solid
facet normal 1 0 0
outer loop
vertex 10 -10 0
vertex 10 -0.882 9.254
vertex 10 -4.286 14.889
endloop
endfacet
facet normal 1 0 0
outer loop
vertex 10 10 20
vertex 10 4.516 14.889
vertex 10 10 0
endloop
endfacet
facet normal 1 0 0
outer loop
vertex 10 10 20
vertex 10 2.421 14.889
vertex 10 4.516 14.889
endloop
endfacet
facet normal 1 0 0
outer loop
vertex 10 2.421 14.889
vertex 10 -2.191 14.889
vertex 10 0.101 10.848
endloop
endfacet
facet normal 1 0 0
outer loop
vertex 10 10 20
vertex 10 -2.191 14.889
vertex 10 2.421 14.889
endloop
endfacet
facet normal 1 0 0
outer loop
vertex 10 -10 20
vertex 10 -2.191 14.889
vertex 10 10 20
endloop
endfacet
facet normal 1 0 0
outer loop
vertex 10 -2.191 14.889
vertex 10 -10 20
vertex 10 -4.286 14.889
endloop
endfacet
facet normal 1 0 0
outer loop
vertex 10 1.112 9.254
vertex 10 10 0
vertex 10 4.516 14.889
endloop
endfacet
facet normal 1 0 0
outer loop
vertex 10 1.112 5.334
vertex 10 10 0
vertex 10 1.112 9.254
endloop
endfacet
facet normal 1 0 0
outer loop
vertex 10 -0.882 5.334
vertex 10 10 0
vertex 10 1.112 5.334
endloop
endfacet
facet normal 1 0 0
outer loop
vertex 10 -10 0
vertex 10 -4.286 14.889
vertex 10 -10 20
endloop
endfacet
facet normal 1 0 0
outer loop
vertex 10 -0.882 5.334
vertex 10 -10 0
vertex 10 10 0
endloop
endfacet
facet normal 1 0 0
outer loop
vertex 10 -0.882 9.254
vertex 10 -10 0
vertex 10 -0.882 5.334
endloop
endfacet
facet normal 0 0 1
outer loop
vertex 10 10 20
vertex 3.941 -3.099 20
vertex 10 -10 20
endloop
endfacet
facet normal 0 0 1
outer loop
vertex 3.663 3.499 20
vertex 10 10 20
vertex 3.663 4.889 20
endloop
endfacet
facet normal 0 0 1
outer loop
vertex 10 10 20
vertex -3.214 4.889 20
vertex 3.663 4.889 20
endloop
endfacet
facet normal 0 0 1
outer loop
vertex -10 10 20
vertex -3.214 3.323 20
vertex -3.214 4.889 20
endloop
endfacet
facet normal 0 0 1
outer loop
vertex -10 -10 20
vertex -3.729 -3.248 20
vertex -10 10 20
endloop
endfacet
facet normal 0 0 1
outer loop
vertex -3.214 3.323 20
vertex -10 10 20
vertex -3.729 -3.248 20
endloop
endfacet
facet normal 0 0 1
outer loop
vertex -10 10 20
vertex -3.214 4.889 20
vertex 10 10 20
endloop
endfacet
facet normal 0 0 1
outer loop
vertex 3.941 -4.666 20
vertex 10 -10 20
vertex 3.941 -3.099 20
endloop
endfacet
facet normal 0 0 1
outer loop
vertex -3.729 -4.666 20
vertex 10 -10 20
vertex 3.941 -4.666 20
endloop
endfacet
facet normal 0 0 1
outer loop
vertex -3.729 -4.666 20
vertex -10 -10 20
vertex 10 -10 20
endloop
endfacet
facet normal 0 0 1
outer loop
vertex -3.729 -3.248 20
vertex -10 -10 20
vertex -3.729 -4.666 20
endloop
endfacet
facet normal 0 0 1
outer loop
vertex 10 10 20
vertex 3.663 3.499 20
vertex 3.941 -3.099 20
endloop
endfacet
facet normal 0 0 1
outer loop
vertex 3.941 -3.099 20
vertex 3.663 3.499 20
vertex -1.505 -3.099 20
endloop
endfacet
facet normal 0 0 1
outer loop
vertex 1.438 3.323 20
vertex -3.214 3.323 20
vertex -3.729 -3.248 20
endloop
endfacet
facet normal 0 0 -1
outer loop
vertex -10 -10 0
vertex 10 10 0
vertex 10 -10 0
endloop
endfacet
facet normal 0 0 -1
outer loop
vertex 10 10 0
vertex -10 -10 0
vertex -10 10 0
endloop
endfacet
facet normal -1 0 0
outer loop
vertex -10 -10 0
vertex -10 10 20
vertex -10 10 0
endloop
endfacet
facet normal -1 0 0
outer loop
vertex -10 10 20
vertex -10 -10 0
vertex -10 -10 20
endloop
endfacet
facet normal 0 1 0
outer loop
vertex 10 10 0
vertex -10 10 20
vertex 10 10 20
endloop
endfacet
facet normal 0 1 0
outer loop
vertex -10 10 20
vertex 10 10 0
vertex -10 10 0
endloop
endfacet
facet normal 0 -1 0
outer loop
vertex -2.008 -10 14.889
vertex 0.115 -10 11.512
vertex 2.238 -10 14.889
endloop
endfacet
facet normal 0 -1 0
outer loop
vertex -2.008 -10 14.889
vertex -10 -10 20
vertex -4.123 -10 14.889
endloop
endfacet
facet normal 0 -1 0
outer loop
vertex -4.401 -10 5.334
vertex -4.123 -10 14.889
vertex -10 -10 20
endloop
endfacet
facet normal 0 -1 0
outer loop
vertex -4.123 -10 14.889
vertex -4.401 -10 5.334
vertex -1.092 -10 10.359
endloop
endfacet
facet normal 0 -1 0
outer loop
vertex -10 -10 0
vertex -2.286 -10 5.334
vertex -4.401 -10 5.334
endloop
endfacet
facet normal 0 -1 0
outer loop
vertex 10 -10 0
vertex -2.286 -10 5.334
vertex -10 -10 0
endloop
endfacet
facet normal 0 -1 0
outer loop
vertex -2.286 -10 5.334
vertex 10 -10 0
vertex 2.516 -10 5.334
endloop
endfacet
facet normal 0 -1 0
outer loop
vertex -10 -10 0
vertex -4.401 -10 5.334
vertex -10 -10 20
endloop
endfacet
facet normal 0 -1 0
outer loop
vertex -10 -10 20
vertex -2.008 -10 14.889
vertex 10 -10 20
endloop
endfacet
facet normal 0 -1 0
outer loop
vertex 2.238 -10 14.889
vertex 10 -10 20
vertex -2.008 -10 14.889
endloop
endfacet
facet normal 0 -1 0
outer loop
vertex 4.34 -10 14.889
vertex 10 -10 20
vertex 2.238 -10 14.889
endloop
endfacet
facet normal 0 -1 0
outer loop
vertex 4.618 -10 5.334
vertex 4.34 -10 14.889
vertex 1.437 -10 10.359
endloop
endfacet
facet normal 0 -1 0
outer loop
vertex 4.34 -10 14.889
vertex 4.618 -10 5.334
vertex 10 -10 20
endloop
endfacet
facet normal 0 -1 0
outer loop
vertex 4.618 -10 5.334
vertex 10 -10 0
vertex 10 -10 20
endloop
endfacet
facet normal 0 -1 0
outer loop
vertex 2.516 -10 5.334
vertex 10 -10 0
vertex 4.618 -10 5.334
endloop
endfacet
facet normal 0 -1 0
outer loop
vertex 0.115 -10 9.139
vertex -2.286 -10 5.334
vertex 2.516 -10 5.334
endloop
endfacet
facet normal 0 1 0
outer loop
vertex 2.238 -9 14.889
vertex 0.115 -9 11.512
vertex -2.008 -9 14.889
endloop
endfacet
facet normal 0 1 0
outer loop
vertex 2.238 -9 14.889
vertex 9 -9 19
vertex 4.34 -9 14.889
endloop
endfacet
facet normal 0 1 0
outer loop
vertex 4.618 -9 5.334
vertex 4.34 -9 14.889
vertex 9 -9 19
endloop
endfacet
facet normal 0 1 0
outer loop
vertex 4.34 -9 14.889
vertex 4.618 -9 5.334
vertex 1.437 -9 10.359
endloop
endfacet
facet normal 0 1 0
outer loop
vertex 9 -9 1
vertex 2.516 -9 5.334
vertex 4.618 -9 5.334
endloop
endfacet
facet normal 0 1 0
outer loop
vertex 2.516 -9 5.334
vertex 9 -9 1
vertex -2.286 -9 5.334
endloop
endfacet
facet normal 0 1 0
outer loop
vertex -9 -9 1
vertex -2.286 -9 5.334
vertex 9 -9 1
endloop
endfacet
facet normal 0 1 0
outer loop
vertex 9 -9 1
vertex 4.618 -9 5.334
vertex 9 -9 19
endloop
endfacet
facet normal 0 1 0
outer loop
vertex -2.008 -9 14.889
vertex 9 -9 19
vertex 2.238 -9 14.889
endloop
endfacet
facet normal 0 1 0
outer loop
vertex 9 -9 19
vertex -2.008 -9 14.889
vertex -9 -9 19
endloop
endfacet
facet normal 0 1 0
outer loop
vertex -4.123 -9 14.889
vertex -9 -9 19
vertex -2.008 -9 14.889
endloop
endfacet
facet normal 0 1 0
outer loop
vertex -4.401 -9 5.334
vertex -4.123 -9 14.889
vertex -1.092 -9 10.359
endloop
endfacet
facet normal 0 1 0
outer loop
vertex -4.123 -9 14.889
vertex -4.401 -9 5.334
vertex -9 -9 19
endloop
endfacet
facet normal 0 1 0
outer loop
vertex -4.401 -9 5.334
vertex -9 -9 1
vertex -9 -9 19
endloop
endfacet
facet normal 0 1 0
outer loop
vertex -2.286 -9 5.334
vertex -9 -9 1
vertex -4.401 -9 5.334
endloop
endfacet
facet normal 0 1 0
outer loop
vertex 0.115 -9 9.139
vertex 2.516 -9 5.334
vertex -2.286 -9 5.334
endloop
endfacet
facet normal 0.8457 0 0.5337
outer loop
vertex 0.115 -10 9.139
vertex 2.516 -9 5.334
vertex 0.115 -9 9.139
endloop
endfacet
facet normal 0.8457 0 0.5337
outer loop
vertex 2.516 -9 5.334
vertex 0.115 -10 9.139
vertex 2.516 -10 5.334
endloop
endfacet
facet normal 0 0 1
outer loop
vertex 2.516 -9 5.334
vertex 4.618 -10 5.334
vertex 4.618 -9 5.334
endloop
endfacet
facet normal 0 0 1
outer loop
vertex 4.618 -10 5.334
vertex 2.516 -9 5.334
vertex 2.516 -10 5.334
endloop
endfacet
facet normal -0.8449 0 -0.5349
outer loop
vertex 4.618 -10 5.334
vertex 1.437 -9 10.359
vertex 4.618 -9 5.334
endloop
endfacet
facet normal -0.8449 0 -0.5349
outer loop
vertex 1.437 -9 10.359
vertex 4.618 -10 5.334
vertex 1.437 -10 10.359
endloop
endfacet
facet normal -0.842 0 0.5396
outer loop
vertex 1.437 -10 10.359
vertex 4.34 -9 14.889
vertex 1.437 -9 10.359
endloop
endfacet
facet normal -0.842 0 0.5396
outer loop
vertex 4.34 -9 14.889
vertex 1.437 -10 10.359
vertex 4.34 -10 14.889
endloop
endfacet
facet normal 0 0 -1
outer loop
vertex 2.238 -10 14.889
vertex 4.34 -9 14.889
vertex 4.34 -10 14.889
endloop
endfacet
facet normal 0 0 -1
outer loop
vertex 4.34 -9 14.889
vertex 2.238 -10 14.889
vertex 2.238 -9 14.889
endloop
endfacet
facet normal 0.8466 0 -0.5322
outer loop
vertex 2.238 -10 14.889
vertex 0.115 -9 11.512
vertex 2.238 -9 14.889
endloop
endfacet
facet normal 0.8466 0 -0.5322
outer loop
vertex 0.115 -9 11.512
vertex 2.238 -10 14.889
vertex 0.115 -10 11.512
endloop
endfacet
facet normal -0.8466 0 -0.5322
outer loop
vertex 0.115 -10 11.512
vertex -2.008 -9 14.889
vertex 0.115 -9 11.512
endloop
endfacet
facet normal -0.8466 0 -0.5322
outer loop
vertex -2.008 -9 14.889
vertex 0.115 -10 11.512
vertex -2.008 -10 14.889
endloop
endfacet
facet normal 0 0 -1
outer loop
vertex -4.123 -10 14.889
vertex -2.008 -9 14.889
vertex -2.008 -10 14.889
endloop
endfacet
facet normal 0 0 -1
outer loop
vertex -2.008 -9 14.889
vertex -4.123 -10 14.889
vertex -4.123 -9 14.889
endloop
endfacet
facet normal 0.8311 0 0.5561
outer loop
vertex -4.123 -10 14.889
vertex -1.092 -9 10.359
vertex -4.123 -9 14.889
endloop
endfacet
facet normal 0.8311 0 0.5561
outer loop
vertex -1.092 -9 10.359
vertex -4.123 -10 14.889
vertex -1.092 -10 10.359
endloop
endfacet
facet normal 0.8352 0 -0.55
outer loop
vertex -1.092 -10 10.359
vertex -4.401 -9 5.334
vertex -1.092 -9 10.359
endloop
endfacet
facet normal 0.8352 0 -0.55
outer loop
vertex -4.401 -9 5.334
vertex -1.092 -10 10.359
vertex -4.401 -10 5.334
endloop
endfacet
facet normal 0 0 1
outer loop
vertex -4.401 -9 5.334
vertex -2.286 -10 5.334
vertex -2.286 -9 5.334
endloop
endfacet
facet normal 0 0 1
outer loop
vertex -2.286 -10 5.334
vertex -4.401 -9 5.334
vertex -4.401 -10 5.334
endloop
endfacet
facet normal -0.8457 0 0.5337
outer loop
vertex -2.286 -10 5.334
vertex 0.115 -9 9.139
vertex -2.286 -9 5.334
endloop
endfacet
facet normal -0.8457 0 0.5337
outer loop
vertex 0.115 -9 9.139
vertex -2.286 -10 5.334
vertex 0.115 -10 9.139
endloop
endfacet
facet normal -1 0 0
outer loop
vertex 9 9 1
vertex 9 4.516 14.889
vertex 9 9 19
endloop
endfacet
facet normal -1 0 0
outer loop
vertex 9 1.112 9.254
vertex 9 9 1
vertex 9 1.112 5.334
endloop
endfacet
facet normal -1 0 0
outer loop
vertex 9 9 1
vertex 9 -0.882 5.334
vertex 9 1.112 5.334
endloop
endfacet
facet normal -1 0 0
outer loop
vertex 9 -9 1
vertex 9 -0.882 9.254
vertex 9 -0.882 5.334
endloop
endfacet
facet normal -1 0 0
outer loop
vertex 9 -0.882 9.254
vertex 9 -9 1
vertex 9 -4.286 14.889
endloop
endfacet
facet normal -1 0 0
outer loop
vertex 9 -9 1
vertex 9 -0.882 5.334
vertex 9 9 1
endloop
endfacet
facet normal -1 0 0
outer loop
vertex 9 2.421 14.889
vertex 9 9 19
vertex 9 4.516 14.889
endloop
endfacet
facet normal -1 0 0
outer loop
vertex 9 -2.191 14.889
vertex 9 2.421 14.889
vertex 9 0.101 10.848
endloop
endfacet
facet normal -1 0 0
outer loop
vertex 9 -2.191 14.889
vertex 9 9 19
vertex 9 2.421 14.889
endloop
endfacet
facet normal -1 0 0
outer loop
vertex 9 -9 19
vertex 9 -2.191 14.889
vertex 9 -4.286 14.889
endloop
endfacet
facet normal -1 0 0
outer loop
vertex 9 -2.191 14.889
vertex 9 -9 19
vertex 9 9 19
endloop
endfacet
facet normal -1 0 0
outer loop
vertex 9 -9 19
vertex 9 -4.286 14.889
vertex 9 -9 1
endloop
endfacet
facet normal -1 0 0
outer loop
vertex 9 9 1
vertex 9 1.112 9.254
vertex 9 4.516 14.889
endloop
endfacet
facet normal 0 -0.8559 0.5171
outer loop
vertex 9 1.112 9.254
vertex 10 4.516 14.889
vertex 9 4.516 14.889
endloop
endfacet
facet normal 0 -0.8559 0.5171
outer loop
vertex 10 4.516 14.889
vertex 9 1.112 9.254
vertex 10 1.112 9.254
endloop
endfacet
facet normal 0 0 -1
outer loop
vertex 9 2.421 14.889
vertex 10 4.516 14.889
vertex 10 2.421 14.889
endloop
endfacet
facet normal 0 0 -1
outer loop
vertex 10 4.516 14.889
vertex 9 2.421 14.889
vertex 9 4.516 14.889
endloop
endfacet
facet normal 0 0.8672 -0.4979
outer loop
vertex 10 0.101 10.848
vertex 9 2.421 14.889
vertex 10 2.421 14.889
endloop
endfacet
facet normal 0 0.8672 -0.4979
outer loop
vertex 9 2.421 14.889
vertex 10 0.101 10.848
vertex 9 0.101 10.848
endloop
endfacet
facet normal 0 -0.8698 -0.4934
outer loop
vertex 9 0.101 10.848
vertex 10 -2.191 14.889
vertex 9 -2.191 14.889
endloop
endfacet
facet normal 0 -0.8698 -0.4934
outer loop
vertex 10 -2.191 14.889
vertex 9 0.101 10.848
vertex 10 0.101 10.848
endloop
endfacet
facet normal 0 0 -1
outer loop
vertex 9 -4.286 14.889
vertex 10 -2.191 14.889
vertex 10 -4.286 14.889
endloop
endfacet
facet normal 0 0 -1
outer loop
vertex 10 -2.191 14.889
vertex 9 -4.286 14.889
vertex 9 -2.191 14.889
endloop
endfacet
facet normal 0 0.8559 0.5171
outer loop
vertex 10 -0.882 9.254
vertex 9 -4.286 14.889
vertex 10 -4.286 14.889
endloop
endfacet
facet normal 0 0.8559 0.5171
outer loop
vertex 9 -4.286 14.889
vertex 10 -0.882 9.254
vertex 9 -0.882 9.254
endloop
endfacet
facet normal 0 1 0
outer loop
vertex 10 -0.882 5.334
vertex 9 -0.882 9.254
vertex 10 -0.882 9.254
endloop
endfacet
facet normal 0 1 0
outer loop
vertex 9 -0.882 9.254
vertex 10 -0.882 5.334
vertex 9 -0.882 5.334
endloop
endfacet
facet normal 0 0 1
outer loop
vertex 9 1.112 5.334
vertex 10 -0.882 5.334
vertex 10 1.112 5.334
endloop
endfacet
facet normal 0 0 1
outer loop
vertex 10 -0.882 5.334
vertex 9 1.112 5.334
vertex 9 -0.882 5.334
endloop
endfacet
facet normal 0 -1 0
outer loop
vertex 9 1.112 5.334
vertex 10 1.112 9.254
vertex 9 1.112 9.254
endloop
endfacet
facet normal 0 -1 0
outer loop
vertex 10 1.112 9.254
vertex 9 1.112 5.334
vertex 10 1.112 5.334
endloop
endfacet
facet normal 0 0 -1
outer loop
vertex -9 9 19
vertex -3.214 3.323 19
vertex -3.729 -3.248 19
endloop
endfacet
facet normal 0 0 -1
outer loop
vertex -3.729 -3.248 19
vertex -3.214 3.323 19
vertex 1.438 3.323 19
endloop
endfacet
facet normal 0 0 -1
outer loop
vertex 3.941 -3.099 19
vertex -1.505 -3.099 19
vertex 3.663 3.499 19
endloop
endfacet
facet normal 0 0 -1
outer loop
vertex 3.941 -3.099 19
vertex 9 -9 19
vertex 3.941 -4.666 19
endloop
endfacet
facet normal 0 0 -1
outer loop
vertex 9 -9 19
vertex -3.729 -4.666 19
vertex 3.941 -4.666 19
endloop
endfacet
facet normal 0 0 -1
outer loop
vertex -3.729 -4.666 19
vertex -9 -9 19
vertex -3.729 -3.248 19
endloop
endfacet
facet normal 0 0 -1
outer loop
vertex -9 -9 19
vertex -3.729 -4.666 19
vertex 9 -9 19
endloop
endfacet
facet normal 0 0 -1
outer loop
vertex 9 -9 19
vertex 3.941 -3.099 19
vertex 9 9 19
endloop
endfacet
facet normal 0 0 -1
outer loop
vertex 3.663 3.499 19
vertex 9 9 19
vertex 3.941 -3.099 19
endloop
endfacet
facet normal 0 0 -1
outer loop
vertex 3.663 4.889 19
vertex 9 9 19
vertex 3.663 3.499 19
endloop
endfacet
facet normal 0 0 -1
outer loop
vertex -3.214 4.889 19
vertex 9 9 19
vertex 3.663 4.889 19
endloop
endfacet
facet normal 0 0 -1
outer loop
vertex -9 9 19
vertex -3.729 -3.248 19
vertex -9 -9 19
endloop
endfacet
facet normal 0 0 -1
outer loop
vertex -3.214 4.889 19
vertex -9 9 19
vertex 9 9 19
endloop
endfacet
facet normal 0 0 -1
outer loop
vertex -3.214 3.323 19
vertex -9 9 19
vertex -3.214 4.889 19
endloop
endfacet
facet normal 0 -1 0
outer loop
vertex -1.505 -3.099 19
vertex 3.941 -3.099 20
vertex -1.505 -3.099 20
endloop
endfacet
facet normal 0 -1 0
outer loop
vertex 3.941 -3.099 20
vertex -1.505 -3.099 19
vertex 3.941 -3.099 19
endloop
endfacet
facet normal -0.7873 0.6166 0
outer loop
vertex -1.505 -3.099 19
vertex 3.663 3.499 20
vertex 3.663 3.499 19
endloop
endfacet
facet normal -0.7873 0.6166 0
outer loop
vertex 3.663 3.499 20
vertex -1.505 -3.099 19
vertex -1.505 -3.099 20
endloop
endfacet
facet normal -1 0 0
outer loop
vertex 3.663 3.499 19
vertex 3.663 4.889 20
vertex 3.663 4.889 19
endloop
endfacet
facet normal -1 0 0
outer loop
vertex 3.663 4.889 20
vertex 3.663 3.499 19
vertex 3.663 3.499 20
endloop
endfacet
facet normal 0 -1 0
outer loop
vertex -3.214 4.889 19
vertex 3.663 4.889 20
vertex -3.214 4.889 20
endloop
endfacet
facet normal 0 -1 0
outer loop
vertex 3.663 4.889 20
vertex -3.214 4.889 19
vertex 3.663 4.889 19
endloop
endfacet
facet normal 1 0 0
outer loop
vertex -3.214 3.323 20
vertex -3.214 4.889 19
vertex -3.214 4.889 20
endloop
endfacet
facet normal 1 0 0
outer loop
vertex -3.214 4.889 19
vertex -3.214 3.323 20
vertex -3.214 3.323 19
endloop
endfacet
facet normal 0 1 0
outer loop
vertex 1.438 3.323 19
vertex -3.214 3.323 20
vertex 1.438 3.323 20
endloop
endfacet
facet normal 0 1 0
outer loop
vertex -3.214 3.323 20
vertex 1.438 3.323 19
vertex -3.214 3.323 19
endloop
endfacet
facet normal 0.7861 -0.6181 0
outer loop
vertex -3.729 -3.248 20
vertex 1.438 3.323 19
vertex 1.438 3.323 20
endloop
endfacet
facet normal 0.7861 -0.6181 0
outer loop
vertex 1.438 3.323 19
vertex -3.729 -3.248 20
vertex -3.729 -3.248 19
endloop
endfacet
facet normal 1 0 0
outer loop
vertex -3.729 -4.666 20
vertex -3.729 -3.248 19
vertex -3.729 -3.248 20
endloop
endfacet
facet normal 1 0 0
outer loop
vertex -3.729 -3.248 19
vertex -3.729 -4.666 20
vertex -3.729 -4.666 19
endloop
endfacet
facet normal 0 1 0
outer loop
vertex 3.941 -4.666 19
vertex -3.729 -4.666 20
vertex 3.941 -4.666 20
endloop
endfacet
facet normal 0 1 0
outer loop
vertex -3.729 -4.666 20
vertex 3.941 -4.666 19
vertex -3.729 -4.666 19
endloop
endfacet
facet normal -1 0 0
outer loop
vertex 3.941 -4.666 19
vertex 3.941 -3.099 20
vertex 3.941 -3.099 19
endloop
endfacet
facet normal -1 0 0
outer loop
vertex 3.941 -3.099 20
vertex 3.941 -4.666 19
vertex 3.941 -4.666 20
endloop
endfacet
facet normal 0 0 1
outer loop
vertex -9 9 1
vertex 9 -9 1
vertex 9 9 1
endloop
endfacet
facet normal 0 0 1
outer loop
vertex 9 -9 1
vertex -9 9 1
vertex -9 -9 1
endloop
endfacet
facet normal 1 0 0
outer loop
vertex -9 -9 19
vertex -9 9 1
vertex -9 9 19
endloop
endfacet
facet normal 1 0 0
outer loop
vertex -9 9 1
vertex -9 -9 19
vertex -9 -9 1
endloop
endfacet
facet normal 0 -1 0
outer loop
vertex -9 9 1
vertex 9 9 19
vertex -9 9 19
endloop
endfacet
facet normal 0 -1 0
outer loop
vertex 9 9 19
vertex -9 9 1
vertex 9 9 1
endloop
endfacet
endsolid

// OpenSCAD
// XYZ 20mm Hollow Calibration Cube
// Based on the design proposed by iDig3Dprinting https://www.thingiverse.com/thing:1278865
// Freely adapted by 5@xes

font = "Arial:style=Bold";

$fn=100;

cube_size = 20;
letter_size = 0.5*cube_size;
letter_height = 0.2*letter_size;

o = cube_size / 2 - letter_height / 2;

module letter(Txt) {
  color("Yellow")
  linear_extrude(height = letter_height) {
    text(Txt, size = letter_size, font = font, halign = "center", valign = "center");
  }
}

translate([0, 0, 10]) difference() {
  color("gray") 
  cube(cube_size, center = true);
  translate([0, -o, 0]) rotate([90, 0, 0]) letter("X");
  translate([o, 0, 0]) rotate([90, 0, 90]) letter("Y");
  translate([0, 0, o])  letter("Z");
  cube((cube_size-letter_height), center = true);
}
